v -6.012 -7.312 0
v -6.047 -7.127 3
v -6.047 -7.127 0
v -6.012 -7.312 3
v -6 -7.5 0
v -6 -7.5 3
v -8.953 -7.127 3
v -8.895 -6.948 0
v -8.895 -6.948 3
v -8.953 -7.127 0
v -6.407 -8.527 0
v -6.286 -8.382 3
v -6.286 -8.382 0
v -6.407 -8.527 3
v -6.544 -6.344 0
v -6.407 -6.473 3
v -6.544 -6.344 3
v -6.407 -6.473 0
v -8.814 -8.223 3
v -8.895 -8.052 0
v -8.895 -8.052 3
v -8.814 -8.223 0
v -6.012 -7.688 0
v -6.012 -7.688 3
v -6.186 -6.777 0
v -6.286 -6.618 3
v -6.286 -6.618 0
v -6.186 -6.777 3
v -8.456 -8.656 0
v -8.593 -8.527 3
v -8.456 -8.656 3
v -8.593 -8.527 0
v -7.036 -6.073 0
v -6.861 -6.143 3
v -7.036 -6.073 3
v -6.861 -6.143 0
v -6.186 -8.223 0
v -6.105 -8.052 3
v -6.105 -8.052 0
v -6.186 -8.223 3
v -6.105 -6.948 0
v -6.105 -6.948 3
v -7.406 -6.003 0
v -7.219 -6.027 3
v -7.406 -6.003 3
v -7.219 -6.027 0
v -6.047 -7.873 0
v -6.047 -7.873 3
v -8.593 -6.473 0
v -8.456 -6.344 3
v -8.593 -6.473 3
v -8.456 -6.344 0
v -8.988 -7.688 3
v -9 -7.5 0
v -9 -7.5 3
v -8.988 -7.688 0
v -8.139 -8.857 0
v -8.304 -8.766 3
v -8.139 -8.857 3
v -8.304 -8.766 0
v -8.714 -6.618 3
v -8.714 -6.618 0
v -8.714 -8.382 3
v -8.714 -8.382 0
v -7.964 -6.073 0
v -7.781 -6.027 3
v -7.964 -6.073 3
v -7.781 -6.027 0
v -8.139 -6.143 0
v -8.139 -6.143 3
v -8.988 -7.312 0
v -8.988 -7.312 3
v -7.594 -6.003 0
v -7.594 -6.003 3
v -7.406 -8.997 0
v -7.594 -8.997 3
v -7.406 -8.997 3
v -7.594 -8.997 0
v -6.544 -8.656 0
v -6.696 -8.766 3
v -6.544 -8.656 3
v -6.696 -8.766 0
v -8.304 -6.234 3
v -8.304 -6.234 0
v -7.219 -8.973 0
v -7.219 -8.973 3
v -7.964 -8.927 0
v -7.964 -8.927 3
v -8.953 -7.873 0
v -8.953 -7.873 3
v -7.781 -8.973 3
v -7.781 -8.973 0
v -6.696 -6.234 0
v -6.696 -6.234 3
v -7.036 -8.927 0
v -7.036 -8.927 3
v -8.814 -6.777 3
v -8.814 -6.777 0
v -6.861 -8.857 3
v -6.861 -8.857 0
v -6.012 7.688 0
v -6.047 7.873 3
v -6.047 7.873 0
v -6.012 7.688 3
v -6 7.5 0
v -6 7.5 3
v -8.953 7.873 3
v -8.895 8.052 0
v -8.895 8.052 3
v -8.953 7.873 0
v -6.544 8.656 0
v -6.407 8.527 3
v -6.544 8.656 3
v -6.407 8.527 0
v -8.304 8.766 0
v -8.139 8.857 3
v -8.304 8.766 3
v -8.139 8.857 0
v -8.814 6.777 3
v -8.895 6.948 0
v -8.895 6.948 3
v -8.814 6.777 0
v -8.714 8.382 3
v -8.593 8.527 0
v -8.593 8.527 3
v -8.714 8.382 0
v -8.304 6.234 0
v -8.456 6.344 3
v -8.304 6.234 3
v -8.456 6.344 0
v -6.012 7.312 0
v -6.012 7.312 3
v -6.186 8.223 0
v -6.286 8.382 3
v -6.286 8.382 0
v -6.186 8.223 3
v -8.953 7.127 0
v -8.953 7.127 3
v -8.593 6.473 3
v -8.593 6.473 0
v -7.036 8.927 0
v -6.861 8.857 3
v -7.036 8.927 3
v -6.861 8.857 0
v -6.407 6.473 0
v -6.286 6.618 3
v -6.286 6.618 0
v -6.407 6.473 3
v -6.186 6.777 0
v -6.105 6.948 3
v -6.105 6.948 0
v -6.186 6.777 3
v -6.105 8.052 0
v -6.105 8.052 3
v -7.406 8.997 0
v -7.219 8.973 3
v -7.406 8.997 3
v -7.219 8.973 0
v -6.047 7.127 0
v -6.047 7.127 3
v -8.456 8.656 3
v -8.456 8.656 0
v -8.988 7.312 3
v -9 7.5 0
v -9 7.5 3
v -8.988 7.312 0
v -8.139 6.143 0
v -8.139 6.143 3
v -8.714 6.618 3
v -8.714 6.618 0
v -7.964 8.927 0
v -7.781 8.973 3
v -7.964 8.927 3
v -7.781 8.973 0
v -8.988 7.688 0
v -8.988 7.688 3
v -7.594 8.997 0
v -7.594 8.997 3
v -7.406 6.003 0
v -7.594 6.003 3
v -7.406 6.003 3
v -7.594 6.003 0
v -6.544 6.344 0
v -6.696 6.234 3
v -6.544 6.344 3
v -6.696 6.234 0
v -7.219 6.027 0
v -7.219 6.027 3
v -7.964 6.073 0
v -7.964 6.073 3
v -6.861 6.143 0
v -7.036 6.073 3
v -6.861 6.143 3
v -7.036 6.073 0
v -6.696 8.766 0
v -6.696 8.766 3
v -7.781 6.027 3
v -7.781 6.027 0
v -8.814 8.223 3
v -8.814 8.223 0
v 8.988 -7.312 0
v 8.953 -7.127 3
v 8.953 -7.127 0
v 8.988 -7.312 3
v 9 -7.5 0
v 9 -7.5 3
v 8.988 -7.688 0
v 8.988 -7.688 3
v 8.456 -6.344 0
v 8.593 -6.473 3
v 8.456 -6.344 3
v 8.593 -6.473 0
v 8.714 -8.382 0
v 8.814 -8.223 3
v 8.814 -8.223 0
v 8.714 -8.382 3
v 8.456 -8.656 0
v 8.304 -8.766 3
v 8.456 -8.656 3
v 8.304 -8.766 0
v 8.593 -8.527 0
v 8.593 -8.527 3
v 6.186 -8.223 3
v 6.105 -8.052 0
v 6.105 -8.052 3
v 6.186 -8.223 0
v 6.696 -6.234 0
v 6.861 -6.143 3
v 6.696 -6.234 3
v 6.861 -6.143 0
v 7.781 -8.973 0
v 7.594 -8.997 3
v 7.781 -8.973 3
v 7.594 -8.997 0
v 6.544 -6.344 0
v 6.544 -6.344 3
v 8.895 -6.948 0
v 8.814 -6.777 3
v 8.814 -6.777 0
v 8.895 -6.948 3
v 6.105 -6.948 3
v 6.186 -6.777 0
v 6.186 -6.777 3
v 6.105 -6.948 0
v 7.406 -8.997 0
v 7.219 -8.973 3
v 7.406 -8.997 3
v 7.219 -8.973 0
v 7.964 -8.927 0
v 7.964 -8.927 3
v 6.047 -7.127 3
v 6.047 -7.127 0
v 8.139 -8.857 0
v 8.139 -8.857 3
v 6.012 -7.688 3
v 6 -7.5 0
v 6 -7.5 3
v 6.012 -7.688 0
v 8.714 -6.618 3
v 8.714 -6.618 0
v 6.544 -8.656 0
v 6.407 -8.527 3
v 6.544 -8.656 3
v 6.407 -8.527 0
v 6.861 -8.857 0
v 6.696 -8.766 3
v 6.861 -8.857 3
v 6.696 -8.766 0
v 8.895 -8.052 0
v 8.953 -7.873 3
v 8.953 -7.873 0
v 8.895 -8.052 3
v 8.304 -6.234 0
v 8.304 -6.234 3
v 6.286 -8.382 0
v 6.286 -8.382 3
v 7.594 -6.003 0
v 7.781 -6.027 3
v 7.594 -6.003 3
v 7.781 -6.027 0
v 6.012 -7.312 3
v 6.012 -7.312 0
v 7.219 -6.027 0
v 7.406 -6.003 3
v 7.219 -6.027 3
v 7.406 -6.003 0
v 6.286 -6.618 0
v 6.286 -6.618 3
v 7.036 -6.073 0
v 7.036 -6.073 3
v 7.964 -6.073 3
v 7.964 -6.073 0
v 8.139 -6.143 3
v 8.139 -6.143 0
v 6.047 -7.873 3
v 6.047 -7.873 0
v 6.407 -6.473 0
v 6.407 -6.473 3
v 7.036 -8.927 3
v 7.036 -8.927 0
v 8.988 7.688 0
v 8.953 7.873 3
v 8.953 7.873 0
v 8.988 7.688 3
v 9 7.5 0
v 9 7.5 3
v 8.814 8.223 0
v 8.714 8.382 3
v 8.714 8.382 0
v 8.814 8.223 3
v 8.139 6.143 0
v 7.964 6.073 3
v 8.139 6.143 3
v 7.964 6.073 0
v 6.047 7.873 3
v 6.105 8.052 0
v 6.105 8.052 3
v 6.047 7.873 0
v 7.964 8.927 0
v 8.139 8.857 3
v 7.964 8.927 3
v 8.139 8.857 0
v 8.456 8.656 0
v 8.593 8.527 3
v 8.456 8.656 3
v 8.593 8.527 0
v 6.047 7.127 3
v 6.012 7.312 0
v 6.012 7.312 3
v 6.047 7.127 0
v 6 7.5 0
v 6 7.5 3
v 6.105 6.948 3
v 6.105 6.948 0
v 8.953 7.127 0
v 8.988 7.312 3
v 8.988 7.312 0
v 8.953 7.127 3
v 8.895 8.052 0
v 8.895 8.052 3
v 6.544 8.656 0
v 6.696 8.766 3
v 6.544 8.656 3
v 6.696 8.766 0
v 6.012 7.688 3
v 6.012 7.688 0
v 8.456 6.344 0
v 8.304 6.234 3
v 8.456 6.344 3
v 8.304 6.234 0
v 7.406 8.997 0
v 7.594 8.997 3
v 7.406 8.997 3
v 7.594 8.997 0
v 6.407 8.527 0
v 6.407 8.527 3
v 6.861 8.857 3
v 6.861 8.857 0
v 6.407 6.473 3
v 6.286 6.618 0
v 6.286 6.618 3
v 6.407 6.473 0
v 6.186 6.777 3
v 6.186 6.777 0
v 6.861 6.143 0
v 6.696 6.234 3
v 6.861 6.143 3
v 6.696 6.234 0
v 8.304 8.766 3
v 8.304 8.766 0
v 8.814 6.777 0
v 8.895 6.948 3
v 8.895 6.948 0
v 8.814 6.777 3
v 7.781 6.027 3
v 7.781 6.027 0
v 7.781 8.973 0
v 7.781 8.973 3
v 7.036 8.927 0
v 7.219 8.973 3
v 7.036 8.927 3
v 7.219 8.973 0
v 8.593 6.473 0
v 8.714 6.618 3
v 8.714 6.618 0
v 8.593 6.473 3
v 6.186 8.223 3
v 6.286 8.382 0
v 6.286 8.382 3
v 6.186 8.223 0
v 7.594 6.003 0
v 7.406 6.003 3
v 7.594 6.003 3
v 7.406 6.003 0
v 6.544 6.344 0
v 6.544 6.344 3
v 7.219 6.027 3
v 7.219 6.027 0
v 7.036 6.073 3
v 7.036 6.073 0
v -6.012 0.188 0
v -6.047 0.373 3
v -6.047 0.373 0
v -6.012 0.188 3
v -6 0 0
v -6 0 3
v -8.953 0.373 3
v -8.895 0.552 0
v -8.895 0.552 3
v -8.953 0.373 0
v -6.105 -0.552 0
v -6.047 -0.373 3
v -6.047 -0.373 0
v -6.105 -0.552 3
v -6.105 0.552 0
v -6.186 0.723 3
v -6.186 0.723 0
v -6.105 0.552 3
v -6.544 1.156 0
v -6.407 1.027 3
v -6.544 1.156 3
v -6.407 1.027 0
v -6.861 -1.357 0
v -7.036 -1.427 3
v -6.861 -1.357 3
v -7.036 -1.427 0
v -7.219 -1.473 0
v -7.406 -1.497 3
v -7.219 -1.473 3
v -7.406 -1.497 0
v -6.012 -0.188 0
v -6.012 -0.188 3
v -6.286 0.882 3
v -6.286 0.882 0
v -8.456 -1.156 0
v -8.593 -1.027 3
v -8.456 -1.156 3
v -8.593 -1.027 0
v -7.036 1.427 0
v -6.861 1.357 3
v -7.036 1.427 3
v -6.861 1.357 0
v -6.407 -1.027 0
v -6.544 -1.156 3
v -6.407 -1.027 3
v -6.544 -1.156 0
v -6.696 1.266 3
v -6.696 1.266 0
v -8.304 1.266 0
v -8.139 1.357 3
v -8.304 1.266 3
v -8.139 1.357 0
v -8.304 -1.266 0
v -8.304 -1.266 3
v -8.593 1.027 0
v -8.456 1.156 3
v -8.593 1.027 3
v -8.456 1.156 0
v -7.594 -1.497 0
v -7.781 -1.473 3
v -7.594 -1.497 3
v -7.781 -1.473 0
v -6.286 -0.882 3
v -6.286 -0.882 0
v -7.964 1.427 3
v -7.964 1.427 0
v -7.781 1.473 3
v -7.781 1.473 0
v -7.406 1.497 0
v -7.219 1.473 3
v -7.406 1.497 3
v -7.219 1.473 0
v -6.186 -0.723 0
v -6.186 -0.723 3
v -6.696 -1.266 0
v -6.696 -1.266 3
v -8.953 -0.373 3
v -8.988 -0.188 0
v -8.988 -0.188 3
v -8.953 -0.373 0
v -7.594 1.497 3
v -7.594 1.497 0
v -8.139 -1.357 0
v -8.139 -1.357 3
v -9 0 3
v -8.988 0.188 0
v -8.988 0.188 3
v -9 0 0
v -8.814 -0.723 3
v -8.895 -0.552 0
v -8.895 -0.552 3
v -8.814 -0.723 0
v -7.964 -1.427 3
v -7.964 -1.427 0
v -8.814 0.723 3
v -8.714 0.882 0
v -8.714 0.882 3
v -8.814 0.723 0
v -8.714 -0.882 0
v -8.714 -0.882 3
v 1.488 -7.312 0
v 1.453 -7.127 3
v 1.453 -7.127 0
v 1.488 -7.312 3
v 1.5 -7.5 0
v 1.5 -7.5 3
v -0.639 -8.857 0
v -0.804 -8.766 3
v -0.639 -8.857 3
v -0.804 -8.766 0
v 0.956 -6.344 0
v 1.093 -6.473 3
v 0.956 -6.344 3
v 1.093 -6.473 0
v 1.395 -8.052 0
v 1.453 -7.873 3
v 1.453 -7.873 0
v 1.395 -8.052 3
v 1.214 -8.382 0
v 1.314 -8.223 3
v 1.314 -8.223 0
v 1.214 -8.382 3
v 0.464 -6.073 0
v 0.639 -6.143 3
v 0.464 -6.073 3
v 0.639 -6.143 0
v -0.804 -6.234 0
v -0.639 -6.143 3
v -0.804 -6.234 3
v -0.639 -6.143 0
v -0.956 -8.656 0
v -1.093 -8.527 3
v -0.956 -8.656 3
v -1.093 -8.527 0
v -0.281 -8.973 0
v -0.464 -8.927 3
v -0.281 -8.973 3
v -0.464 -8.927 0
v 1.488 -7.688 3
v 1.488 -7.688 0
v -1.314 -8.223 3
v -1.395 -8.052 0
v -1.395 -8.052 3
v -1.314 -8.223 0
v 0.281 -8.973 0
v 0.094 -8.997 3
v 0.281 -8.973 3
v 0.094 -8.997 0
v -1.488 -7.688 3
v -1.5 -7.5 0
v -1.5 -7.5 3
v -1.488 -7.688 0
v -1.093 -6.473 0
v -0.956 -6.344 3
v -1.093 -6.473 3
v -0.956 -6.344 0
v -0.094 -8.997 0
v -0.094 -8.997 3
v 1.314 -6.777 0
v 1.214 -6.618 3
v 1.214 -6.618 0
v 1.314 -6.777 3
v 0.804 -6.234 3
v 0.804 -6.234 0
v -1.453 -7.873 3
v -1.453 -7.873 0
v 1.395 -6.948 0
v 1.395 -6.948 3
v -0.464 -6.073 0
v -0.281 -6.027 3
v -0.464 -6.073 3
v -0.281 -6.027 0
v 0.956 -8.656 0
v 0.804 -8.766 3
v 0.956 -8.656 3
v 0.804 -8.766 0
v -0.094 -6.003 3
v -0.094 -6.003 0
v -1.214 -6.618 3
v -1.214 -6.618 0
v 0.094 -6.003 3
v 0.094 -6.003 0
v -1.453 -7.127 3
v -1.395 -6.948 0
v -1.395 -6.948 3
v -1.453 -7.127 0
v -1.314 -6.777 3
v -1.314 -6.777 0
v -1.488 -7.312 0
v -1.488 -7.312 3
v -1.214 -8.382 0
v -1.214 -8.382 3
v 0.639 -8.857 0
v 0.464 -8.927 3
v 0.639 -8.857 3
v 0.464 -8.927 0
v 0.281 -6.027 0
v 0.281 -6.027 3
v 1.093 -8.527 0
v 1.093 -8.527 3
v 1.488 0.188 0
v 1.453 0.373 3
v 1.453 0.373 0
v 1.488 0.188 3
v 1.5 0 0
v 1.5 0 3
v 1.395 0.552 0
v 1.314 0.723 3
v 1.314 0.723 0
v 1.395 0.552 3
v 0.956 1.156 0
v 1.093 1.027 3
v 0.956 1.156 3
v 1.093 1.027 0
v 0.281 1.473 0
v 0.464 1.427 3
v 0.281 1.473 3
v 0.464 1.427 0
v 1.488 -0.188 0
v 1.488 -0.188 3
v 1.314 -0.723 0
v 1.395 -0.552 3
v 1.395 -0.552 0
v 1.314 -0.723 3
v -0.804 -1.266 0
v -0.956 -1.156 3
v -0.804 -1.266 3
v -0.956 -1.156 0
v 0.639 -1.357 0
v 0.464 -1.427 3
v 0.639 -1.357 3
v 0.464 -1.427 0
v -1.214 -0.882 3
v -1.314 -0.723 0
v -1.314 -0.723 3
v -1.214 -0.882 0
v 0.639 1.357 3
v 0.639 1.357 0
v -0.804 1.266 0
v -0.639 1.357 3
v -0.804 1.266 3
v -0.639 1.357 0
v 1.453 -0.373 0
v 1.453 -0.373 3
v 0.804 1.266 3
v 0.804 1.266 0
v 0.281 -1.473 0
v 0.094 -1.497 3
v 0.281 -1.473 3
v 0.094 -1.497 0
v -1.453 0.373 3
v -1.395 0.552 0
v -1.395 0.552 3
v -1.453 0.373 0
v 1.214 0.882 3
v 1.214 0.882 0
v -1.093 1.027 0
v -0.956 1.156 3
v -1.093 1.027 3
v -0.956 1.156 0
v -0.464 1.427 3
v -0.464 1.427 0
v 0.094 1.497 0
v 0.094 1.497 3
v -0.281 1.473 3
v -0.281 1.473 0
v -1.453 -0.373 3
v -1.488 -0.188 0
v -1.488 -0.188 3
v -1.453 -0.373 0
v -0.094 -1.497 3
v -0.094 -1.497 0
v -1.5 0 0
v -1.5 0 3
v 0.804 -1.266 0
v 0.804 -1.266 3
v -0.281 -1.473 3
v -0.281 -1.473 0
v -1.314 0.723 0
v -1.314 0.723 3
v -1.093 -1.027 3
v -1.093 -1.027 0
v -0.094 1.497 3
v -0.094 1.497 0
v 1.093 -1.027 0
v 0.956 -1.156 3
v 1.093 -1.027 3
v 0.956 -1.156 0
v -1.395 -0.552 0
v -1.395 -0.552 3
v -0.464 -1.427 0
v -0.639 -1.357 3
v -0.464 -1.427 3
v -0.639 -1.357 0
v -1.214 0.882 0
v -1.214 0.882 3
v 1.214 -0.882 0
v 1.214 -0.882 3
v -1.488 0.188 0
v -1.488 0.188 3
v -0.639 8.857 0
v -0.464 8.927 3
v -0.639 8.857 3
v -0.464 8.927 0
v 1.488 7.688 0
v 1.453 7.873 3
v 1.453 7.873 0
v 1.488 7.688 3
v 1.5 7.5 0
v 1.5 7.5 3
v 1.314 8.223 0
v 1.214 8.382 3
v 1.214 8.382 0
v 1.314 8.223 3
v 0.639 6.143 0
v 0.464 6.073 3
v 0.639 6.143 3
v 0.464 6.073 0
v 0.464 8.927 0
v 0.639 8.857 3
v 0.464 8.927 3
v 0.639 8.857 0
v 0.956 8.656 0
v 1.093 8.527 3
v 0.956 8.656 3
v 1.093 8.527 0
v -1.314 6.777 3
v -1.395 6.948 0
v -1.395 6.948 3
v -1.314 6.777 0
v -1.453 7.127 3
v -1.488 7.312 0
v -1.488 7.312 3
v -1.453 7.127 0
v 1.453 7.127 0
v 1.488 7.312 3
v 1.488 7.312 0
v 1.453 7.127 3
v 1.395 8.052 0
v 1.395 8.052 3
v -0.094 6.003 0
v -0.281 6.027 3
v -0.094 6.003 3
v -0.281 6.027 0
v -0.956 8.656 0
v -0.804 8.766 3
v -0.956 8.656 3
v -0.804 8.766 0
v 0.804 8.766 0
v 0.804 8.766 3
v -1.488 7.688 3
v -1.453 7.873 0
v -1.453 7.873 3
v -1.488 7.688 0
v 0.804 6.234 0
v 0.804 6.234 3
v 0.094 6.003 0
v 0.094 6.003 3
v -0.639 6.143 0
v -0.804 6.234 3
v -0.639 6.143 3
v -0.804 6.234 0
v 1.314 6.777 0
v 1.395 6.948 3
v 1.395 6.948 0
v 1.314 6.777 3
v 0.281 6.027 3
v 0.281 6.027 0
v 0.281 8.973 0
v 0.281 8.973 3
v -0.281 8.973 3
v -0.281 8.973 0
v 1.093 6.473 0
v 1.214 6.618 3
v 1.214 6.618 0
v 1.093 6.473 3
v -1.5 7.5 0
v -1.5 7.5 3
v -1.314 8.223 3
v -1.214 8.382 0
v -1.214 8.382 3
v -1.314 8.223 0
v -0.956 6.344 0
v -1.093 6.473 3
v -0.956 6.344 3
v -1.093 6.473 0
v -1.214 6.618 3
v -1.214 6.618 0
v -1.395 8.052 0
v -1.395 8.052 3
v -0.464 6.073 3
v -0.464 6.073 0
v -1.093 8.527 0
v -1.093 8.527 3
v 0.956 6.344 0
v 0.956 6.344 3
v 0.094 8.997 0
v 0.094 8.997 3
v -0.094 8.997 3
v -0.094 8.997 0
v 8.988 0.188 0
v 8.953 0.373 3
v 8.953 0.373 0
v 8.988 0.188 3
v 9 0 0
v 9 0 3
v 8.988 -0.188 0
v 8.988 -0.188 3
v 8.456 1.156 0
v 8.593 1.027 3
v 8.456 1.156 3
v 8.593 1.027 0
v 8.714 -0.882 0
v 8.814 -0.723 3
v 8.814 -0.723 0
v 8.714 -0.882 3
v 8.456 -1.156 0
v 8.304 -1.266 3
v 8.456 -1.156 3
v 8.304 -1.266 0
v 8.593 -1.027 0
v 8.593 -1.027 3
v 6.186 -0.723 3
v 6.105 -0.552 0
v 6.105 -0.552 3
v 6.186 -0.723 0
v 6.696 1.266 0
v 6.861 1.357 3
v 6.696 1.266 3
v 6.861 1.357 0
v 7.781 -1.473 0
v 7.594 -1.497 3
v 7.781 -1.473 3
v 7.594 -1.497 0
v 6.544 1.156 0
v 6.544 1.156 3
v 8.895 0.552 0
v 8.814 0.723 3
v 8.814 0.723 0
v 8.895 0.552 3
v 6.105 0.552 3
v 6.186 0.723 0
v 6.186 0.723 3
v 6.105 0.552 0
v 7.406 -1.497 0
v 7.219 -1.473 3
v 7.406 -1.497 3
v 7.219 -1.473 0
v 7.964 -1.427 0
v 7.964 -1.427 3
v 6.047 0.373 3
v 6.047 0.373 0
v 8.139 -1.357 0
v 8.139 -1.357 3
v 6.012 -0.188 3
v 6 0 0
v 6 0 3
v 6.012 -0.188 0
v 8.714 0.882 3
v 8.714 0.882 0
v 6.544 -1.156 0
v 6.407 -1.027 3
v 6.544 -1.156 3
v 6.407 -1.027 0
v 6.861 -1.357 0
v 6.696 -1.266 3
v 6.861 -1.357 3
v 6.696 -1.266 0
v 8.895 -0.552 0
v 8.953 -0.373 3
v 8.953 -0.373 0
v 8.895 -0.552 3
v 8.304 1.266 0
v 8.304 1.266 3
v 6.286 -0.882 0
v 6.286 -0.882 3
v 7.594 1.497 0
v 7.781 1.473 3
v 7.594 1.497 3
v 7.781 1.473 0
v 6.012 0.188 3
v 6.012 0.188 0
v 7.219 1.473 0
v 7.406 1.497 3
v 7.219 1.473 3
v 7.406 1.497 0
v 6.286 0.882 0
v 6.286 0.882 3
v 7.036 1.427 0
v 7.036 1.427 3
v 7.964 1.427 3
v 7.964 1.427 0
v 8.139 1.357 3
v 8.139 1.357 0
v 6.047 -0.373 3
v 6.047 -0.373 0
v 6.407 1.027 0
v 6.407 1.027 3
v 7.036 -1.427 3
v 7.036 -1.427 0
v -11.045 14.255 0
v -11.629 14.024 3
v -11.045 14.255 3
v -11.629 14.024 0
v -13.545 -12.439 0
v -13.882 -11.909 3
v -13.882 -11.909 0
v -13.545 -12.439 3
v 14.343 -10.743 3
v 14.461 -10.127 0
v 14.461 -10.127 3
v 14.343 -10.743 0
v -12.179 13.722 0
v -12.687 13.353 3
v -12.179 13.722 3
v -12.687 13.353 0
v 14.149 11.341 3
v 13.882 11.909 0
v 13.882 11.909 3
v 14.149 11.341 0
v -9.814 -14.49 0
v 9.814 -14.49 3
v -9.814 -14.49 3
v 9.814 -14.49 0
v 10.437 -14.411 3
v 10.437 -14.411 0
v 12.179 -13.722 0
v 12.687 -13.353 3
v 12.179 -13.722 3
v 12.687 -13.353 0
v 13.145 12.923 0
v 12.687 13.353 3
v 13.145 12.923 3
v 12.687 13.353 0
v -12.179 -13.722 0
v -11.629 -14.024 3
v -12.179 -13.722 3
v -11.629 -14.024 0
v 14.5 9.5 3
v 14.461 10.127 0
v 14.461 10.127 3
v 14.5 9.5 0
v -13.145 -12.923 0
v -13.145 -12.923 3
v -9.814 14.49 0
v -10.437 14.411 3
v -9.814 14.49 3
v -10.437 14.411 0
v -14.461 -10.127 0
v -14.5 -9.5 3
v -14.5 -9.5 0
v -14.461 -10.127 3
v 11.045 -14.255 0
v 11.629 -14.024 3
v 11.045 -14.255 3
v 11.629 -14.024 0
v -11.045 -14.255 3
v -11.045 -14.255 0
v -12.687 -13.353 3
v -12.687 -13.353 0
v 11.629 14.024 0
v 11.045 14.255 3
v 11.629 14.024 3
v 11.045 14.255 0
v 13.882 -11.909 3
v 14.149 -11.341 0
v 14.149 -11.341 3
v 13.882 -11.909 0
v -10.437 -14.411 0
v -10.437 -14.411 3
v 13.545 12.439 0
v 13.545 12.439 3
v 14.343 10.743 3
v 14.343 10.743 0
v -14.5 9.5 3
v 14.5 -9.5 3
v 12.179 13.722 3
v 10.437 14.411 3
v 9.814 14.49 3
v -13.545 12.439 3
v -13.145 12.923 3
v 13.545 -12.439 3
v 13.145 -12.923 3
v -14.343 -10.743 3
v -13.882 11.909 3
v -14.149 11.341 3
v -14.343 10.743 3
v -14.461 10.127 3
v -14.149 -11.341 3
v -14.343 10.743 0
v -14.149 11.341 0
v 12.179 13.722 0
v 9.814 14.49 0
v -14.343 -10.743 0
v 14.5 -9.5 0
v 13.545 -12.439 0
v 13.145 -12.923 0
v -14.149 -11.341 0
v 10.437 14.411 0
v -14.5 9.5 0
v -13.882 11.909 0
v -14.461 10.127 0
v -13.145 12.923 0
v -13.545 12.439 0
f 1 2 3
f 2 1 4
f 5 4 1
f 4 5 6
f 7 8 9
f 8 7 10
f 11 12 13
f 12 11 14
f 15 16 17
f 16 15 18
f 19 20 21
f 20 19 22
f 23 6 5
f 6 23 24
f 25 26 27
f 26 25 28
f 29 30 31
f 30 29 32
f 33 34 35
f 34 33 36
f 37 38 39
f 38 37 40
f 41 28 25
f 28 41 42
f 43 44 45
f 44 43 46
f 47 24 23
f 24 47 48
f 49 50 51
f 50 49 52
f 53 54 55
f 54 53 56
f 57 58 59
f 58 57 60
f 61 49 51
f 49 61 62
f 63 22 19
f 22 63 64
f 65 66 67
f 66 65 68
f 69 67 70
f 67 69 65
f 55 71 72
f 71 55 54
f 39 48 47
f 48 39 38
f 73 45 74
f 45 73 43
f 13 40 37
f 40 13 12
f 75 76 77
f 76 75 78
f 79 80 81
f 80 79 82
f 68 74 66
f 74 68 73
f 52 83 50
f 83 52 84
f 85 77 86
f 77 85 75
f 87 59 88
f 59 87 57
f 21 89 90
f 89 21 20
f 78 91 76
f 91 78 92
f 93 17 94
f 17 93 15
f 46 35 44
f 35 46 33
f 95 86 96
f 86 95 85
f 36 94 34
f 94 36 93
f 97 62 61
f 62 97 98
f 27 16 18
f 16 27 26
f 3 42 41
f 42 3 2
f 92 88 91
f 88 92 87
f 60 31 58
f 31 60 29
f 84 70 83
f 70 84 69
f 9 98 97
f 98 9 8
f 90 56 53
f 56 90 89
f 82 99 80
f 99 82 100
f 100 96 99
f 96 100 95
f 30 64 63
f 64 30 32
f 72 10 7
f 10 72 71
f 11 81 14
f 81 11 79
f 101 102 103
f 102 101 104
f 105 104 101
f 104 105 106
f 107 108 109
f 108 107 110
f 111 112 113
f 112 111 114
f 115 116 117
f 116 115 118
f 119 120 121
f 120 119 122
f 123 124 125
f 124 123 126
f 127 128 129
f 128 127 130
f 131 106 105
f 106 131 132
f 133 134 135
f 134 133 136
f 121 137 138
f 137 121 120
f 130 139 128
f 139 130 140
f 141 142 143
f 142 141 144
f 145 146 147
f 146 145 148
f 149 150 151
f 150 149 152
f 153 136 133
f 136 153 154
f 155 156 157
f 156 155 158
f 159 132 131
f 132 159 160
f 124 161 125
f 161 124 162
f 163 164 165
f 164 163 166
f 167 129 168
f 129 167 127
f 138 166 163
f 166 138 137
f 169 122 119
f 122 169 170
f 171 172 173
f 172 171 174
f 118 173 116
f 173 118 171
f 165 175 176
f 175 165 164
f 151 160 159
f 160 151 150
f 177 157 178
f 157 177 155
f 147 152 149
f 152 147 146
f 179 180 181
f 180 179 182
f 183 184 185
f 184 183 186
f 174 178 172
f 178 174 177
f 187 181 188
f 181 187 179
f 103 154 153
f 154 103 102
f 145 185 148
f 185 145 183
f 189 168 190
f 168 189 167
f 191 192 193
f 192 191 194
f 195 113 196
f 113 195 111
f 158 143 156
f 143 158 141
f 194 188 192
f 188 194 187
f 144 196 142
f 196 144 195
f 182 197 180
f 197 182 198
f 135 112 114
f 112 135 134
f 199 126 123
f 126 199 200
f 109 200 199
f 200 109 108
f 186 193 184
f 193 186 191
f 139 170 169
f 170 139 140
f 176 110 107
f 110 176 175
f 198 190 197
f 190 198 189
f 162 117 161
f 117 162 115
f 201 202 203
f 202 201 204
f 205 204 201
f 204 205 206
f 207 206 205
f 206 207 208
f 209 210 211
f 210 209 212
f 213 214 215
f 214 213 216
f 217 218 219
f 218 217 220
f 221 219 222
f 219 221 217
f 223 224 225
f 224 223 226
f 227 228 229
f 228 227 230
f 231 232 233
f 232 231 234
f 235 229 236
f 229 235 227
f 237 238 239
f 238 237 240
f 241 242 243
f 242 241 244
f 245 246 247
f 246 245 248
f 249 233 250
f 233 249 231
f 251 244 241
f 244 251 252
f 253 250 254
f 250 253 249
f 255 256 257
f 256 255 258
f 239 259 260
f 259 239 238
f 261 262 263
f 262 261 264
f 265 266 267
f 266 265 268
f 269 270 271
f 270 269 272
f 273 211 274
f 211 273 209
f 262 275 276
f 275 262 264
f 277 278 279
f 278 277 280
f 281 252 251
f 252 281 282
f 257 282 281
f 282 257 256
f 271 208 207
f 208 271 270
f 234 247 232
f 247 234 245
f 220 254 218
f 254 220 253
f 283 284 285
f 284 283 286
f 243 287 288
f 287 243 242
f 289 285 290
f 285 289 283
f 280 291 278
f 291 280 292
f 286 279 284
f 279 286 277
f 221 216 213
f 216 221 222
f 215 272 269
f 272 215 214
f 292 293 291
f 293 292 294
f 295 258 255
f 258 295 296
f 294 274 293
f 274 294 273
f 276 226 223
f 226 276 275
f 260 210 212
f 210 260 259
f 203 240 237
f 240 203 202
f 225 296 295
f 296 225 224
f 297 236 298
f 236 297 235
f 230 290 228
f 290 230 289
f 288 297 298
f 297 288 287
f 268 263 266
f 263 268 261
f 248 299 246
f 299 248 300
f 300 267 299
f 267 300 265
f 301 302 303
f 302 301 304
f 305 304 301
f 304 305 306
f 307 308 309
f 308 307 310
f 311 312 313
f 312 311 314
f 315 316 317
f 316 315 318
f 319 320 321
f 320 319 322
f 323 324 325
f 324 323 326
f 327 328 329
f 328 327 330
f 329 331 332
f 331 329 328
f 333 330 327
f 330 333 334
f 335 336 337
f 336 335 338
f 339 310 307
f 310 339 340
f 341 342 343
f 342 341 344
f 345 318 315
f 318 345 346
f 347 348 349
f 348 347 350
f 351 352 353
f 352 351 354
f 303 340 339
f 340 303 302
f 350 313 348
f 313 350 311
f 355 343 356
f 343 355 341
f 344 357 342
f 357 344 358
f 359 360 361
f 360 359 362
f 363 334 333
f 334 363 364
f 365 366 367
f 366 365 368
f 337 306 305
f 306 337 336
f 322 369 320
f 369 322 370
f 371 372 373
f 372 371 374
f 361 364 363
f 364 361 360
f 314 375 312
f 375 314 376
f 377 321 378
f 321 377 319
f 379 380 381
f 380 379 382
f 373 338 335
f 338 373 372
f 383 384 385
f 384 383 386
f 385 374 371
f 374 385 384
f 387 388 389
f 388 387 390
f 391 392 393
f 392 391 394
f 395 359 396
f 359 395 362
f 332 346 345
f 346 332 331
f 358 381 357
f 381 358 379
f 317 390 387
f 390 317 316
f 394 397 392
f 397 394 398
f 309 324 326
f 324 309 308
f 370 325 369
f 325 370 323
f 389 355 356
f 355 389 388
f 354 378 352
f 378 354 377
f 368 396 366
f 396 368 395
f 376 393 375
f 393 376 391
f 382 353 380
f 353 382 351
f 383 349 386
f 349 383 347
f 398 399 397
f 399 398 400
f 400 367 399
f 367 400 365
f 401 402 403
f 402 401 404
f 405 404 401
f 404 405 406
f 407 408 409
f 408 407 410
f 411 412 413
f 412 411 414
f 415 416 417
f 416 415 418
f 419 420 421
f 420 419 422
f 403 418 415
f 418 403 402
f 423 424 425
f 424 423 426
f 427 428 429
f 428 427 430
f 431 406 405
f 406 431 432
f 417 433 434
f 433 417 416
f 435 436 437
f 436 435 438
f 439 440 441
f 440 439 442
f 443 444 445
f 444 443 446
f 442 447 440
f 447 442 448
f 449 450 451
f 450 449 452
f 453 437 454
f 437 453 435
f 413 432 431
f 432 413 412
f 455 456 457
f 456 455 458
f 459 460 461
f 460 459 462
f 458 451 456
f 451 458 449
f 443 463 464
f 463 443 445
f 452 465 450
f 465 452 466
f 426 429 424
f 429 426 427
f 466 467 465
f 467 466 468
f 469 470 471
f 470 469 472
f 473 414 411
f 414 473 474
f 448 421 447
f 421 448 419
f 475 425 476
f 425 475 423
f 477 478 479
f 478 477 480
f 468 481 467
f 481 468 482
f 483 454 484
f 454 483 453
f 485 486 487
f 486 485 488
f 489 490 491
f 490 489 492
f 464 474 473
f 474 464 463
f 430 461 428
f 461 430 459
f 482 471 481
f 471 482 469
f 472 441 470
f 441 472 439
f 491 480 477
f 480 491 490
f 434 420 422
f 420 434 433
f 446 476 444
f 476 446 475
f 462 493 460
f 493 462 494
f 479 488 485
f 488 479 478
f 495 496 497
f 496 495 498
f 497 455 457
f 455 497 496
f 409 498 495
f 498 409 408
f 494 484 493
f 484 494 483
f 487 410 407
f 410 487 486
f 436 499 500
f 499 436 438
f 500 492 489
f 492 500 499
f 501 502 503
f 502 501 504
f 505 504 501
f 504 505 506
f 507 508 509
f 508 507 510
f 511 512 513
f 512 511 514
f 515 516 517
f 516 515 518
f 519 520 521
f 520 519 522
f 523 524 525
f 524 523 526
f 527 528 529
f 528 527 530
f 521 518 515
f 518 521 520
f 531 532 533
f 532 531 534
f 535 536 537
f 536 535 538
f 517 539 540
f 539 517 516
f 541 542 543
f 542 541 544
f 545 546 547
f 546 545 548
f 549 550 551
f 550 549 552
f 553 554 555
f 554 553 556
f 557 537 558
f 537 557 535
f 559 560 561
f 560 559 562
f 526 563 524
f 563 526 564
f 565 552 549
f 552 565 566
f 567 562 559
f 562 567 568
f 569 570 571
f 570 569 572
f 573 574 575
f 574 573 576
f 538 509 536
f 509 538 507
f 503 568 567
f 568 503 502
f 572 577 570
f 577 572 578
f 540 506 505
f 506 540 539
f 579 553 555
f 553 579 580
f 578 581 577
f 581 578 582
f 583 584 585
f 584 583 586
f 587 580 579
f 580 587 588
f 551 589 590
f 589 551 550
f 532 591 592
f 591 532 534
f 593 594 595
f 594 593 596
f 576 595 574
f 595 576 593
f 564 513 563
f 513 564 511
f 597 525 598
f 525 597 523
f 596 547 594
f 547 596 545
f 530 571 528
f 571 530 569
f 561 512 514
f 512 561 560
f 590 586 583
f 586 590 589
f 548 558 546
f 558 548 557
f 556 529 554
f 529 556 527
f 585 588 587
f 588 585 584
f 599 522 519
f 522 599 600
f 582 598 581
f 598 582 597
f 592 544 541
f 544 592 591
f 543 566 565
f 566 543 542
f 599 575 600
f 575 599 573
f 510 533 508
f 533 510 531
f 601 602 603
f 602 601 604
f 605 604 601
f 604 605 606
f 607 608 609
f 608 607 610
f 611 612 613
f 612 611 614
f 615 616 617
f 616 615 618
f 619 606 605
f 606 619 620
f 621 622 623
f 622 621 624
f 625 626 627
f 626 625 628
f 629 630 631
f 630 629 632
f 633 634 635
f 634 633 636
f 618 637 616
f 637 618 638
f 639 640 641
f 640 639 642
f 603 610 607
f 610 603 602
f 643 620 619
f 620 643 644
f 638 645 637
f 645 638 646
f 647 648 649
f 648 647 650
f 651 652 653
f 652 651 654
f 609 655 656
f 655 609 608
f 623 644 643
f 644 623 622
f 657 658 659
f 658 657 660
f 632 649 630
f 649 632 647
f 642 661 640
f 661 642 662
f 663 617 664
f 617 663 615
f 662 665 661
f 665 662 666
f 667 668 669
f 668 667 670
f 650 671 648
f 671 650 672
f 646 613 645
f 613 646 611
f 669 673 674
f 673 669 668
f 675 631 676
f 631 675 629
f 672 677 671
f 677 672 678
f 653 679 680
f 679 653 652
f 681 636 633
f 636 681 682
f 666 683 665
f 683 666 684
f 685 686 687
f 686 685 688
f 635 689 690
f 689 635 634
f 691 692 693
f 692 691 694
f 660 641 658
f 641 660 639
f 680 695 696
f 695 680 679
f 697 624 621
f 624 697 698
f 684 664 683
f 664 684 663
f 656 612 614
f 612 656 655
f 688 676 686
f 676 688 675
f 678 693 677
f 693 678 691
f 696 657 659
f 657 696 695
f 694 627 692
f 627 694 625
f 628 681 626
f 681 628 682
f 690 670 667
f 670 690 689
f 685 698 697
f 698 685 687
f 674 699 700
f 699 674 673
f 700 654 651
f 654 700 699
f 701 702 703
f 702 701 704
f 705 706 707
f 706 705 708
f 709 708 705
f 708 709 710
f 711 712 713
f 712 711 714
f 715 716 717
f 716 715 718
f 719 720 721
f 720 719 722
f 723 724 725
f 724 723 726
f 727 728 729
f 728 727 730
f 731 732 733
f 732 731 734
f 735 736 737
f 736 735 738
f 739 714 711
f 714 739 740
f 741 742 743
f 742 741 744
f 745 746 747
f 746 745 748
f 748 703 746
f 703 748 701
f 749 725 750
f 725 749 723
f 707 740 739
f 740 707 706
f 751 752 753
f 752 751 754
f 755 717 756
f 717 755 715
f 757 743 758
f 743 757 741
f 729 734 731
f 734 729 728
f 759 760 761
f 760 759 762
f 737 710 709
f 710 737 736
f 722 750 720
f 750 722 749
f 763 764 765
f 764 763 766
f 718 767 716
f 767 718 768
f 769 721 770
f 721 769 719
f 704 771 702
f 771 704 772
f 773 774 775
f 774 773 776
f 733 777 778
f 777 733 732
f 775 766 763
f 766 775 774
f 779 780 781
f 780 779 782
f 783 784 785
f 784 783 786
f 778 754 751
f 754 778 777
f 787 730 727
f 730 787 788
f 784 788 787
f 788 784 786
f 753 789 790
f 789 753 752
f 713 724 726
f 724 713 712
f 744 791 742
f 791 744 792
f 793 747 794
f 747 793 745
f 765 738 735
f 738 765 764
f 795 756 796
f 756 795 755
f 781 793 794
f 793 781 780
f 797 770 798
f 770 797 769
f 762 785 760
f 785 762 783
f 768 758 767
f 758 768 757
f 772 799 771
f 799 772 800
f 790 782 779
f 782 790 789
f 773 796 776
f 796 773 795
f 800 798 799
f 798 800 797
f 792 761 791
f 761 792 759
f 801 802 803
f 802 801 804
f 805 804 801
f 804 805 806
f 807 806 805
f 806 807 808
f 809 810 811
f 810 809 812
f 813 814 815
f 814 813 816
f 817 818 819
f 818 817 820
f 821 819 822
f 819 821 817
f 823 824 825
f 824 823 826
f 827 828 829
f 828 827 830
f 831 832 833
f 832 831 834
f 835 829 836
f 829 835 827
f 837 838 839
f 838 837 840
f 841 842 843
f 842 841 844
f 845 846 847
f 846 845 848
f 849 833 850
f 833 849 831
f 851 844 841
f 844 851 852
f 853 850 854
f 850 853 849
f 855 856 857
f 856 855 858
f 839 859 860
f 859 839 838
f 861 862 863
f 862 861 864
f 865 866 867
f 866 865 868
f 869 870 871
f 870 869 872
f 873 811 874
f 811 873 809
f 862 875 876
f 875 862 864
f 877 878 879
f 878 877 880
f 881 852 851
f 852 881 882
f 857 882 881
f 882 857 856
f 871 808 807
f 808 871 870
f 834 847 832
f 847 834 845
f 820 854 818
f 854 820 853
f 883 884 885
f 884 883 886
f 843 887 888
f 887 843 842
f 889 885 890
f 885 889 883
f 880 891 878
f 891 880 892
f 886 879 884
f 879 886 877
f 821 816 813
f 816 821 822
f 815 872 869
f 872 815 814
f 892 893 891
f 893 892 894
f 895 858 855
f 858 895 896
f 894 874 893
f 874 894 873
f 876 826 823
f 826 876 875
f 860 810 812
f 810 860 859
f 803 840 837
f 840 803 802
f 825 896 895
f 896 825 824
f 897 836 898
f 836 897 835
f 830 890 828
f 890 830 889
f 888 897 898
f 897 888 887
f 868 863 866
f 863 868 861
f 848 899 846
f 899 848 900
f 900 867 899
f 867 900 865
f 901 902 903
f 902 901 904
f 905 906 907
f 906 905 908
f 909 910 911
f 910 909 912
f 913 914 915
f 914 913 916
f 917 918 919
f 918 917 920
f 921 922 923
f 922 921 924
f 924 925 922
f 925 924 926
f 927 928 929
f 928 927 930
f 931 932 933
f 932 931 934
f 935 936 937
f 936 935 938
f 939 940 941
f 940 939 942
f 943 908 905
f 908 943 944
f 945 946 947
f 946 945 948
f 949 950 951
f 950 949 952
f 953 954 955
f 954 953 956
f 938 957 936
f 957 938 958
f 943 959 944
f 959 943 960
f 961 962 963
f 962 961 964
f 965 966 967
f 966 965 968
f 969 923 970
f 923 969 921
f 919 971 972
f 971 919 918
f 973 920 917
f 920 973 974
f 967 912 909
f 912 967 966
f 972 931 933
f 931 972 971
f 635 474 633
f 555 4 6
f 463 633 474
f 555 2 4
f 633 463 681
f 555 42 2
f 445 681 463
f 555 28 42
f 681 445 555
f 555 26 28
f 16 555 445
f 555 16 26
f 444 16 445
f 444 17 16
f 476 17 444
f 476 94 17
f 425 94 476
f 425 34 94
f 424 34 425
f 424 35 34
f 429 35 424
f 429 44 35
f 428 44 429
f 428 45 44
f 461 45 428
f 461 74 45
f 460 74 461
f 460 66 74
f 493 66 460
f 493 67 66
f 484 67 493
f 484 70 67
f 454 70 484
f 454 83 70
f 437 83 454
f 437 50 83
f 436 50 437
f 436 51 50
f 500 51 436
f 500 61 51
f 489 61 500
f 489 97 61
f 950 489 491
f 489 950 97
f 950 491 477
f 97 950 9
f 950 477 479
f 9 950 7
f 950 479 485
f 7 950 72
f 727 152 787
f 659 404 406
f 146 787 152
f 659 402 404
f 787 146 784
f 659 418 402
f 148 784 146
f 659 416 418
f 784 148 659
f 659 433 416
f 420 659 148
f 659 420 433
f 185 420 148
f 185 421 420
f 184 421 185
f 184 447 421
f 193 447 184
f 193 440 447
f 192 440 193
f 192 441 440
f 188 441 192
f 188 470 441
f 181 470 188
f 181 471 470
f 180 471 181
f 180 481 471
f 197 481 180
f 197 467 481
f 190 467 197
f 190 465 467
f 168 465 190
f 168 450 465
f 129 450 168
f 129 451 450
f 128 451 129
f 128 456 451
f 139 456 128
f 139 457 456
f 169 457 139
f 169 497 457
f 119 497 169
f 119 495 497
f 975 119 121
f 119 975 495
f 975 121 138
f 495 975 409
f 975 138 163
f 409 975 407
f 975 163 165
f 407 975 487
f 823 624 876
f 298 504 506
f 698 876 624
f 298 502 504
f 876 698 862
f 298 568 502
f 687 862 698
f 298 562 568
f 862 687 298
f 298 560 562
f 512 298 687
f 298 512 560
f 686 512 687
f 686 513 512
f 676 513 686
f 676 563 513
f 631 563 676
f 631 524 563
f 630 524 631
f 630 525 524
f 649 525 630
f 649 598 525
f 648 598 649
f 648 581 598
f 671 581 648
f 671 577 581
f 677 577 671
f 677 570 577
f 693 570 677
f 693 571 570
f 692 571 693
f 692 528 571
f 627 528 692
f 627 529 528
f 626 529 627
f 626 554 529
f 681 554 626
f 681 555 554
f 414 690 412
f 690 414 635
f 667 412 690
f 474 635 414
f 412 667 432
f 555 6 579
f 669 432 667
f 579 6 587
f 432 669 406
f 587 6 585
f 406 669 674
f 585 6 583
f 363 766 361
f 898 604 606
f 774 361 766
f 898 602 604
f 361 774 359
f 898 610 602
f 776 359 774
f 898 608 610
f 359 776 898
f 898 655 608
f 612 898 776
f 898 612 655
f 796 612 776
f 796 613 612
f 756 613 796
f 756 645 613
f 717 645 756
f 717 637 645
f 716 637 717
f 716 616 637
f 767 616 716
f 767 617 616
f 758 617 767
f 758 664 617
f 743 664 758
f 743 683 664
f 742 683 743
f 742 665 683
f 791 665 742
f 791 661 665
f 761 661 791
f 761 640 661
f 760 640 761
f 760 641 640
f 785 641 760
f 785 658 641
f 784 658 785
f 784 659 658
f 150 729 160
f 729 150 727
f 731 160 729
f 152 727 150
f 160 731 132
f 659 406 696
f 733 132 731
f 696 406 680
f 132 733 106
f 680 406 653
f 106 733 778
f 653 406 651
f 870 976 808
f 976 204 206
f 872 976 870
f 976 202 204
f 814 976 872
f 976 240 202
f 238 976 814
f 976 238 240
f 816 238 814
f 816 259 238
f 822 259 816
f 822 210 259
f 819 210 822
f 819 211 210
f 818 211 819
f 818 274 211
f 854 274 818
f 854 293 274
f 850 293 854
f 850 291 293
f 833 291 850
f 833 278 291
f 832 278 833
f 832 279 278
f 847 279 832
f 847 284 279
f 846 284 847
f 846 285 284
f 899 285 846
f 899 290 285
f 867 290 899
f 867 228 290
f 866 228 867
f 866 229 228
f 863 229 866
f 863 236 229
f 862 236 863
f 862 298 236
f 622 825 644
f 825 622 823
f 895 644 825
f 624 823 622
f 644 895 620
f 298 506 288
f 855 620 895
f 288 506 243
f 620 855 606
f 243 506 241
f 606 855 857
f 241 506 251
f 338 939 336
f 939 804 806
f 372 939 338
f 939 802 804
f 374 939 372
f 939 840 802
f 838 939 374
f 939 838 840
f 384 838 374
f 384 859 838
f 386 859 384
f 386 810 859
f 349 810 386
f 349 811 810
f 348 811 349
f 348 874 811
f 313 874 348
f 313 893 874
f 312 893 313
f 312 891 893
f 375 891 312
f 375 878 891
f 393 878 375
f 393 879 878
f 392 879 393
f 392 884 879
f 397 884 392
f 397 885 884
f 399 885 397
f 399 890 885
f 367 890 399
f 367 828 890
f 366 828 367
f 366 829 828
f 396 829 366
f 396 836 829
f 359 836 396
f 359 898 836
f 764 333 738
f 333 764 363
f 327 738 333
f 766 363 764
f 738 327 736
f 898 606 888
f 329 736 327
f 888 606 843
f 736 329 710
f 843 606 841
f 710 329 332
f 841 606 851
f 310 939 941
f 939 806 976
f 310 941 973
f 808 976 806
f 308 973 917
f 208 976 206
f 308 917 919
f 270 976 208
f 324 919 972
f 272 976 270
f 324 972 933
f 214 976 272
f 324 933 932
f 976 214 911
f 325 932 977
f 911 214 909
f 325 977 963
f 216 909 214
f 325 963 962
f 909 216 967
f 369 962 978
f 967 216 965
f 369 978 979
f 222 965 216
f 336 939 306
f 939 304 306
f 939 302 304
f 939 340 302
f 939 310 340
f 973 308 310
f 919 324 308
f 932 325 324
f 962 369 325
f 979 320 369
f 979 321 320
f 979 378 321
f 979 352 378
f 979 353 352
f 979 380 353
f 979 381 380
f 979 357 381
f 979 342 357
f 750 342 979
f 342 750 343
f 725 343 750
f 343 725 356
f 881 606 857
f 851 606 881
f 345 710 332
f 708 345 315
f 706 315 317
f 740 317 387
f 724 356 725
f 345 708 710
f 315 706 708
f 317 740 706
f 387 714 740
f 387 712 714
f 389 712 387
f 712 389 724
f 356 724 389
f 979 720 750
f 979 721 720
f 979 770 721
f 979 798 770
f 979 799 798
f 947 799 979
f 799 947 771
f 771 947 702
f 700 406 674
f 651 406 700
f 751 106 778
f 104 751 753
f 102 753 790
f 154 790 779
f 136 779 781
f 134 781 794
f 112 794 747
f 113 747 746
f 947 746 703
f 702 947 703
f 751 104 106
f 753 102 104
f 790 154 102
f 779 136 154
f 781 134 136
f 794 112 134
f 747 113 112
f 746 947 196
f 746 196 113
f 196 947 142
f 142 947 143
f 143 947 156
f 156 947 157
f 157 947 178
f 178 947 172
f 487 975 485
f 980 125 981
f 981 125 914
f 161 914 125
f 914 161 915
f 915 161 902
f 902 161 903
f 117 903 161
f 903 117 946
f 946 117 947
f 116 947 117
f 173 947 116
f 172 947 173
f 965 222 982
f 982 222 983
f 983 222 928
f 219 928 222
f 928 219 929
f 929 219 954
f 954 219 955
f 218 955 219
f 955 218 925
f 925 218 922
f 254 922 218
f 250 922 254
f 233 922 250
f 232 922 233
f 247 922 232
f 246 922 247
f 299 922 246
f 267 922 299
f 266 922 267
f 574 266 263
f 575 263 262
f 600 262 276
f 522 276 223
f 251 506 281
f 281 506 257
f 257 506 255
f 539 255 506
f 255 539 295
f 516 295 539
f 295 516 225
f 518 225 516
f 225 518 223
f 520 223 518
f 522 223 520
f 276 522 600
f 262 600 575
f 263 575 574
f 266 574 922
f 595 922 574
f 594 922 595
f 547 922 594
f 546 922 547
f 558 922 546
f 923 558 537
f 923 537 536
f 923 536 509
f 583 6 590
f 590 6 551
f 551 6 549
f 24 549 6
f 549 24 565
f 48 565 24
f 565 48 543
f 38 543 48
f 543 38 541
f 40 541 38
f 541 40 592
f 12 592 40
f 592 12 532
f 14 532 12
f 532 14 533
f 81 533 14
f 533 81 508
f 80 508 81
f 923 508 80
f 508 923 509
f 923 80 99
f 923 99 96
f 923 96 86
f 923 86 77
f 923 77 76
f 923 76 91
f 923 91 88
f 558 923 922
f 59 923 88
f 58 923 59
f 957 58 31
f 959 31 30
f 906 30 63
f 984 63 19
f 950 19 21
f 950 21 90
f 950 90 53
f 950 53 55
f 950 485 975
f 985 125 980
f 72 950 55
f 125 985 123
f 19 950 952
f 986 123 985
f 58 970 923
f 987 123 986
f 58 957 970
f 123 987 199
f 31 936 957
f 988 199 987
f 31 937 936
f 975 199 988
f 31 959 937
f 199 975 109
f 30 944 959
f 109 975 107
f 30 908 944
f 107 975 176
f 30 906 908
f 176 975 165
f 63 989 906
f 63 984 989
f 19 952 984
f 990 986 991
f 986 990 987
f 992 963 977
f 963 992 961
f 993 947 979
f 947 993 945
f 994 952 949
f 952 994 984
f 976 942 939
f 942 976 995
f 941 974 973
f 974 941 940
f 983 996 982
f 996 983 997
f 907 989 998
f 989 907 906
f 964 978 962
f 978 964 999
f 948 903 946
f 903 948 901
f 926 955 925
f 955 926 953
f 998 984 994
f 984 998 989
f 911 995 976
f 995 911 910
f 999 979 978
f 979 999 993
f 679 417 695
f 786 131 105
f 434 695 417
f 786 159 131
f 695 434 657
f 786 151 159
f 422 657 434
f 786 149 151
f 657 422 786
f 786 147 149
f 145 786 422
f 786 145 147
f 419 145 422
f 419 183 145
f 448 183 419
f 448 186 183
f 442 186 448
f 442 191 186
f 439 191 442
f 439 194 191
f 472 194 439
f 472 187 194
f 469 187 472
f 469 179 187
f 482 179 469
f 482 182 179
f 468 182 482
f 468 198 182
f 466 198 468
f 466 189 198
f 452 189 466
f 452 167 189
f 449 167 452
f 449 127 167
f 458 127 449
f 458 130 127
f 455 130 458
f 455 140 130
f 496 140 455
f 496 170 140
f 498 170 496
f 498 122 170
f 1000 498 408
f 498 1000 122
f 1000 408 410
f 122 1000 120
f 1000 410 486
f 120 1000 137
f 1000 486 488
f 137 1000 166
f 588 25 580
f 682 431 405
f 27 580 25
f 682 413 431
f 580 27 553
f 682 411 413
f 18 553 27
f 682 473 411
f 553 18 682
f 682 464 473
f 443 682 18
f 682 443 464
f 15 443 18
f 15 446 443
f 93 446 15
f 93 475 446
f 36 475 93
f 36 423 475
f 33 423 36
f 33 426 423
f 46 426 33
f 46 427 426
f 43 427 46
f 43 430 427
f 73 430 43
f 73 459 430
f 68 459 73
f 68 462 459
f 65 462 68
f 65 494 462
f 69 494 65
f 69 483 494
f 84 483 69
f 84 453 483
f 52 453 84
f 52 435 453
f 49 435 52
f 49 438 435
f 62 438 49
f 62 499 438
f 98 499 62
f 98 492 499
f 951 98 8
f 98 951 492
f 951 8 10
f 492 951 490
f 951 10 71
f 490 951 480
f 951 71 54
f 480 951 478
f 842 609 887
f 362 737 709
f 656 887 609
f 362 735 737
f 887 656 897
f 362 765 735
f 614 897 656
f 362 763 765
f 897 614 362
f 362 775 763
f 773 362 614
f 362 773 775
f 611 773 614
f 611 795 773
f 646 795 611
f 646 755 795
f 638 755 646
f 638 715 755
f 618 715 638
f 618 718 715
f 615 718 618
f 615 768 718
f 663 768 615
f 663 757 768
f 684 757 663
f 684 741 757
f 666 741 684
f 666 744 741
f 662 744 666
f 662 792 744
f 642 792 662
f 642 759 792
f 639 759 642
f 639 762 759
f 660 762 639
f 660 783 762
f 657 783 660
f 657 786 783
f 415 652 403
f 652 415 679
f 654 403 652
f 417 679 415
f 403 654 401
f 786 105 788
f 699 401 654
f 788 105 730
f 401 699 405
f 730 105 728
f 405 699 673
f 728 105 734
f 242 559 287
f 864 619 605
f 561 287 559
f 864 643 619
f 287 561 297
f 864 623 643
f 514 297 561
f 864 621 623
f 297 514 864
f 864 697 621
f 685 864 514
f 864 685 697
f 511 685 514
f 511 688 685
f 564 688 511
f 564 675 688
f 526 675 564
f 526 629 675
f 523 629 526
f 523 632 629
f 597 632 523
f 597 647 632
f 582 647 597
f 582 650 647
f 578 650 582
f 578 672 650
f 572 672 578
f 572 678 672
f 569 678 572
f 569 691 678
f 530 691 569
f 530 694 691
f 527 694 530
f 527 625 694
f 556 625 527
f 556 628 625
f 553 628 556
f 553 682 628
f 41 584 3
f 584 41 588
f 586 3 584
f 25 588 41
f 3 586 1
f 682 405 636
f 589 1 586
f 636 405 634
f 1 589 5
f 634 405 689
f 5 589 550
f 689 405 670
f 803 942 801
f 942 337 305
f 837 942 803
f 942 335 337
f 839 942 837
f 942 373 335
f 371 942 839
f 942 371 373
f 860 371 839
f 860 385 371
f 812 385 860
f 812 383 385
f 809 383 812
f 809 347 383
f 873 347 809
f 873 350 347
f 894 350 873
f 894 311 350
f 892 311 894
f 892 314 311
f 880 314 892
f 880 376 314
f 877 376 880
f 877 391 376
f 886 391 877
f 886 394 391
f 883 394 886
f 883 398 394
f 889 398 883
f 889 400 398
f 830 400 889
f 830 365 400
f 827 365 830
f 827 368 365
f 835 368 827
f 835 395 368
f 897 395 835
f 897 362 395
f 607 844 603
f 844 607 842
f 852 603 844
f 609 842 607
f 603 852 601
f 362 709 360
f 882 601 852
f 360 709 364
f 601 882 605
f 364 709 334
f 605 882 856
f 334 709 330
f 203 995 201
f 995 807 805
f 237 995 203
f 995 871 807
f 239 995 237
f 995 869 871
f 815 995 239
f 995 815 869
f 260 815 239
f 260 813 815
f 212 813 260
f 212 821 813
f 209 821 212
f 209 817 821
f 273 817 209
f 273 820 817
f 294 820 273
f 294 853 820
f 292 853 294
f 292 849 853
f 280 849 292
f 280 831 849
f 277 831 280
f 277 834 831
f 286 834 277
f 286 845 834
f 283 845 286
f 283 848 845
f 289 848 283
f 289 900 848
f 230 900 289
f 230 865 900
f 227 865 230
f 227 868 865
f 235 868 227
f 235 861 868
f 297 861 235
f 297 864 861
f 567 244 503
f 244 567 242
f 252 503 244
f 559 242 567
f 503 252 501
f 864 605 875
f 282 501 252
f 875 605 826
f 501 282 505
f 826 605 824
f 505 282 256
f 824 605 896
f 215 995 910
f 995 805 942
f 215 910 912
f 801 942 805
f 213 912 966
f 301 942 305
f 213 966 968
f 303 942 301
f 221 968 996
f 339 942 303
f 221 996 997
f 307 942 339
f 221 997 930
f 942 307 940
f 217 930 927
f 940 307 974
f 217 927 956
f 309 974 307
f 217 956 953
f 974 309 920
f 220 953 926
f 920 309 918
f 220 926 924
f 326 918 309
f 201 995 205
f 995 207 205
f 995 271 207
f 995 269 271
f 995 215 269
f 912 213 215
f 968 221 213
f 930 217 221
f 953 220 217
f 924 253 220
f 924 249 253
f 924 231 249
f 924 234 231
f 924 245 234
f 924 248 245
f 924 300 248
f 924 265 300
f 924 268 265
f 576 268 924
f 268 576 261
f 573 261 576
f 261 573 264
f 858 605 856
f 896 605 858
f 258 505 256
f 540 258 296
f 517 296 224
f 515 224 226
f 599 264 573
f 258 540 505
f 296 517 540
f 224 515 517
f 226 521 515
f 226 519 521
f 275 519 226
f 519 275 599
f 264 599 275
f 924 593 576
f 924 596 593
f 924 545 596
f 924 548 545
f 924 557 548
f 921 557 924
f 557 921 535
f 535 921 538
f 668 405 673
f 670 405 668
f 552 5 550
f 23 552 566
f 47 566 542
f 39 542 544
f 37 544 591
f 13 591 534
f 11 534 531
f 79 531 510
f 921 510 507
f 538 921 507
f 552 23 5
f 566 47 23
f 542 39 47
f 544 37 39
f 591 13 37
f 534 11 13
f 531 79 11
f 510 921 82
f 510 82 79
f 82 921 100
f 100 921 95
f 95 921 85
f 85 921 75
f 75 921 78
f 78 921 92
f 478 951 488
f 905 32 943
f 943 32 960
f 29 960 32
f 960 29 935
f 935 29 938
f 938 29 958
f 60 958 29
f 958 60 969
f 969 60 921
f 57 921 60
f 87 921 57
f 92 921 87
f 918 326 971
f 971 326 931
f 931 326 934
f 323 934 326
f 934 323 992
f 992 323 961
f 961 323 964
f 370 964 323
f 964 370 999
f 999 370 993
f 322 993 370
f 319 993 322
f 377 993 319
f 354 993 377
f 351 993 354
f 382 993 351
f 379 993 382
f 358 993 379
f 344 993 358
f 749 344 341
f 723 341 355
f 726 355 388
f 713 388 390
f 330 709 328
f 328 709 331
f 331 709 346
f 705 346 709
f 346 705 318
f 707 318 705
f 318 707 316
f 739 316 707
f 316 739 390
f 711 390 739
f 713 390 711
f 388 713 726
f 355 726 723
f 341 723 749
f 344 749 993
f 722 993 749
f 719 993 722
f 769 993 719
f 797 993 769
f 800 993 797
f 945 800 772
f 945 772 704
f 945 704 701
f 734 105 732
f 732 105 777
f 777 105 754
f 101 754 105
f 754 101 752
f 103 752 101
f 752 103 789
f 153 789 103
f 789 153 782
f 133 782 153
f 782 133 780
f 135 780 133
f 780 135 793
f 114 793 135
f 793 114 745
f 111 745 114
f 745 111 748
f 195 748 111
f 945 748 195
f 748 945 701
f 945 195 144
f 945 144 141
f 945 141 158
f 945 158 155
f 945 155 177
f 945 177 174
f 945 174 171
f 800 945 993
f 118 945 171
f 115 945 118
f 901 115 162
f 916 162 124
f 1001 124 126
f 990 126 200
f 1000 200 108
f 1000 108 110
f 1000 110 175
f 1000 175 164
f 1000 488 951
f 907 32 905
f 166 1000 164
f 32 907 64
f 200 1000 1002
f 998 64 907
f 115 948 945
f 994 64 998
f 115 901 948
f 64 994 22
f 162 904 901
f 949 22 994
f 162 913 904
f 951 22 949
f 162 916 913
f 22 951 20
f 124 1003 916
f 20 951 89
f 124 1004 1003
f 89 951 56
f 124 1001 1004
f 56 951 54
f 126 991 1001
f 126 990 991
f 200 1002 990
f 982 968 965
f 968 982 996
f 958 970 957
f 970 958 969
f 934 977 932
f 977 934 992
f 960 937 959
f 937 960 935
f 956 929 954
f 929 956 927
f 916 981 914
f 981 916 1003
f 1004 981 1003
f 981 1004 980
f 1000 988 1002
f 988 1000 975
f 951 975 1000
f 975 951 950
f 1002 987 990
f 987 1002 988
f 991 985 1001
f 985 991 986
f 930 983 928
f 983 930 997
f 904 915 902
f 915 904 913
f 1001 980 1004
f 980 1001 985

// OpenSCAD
$fn = 50;


difference() {
	union() {
		hull() {
			translate(v = [-9.5000000000, 9.5000000000, 0]) {
				cylinder(h = 3, r = 5);
			}
			translate(v = [9.5000000000, 9.5000000000, 0]) {
				cylinder(h = 3, r = 5);
			}
			translate(v = [-9.5000000000, -9.5000000000, 0]) {
				cylinder(h = 3, r = 5);
			}
			translate(v = [9.5000000000, -9.5000000000, 0]) {
				cylinder(h = 3, r = 5);
			}
		}
	}
	union() {
		translate(v = [-7.5000000000, -7.5000000000, 0]) {
			translate(v = [0, 0, -100]) {
				cylinder(h = 200, r = 1.5000000000);
			}
		}
		translate(v = [-7.5000000000, 7.5000000000, 0]) {
			translate(v = [0, 0, -100]) {
				cylinder(h = 200, r = 1.5000000000);
			}
		}
		translate(v = [7.5000000000, -7.5000000000, 0]) {
			translate(v = [0, 0, -100]) {
				cylinder(h = 200, r = 1.5000000000);
			}
		}
		translate(v = [7.5000000000, 7.5000000000, 0]) {
			translate(v = [0, 0, -100]) {
				cylinder(h = 200, r = 1.5000000000);
			}
		}
		translate(v = [-7.5000000000, -7.5000000000, 0]) {
			translate(v = [0, 0, -100]) {
				cylinder(h = 200, r = 1.5000000000);
			}
		}
		translate(v = [-7.5000000000, 0.0000000000, 0]) {
			translate(v = [0, 0, -100]) {
				cylinder(h = 200, r = 1.5000000000);
			}
		}
		translate(v = [-7.5000000000, 7.5000000000, 0]) {
			translate(v = [0, 0, -100]) {
				cylinder(h = 200, r = 1.5000000000);
			}
		}
		translate(v = [0.0000000000, -7.5000000000, 0]) {
			translate(v = [0, 0, -100]) {
				cylinder(h = 200, r = 1.5000000000);
			}
		}
		translate(v = [0, 0, -100]) {
			cylinder(h = 200, r = 1.5000000000);
		}
		translate(v = [0.0000000000, 7.5000000000, 0]) {
			translate(v = [0, 0, -100]) {
				cylinder(h = 200, r = 1.5000000000);
			}
		}
		translate(v = [7.5000000000, -7.5000000000, 0]) {
			translate(v = [0, 0, -100]) {
				cylinder(h = 200, r = 1.5000000000);
			}
		}
		translate(v = [7.5000000000, 0.0000000000, 0]) {
			translate(v = [0, 0, -100]) {
				cylinder(h = 200, r = 1.5000000000);
			}
		}
		translate(v = [7.5000000000, 7.5000000000, 0]) {
			translate(v = [0, 0, -100]) {
				cylinder(h = 200, r = 1.5000000000);
			}
		}
	}
}
